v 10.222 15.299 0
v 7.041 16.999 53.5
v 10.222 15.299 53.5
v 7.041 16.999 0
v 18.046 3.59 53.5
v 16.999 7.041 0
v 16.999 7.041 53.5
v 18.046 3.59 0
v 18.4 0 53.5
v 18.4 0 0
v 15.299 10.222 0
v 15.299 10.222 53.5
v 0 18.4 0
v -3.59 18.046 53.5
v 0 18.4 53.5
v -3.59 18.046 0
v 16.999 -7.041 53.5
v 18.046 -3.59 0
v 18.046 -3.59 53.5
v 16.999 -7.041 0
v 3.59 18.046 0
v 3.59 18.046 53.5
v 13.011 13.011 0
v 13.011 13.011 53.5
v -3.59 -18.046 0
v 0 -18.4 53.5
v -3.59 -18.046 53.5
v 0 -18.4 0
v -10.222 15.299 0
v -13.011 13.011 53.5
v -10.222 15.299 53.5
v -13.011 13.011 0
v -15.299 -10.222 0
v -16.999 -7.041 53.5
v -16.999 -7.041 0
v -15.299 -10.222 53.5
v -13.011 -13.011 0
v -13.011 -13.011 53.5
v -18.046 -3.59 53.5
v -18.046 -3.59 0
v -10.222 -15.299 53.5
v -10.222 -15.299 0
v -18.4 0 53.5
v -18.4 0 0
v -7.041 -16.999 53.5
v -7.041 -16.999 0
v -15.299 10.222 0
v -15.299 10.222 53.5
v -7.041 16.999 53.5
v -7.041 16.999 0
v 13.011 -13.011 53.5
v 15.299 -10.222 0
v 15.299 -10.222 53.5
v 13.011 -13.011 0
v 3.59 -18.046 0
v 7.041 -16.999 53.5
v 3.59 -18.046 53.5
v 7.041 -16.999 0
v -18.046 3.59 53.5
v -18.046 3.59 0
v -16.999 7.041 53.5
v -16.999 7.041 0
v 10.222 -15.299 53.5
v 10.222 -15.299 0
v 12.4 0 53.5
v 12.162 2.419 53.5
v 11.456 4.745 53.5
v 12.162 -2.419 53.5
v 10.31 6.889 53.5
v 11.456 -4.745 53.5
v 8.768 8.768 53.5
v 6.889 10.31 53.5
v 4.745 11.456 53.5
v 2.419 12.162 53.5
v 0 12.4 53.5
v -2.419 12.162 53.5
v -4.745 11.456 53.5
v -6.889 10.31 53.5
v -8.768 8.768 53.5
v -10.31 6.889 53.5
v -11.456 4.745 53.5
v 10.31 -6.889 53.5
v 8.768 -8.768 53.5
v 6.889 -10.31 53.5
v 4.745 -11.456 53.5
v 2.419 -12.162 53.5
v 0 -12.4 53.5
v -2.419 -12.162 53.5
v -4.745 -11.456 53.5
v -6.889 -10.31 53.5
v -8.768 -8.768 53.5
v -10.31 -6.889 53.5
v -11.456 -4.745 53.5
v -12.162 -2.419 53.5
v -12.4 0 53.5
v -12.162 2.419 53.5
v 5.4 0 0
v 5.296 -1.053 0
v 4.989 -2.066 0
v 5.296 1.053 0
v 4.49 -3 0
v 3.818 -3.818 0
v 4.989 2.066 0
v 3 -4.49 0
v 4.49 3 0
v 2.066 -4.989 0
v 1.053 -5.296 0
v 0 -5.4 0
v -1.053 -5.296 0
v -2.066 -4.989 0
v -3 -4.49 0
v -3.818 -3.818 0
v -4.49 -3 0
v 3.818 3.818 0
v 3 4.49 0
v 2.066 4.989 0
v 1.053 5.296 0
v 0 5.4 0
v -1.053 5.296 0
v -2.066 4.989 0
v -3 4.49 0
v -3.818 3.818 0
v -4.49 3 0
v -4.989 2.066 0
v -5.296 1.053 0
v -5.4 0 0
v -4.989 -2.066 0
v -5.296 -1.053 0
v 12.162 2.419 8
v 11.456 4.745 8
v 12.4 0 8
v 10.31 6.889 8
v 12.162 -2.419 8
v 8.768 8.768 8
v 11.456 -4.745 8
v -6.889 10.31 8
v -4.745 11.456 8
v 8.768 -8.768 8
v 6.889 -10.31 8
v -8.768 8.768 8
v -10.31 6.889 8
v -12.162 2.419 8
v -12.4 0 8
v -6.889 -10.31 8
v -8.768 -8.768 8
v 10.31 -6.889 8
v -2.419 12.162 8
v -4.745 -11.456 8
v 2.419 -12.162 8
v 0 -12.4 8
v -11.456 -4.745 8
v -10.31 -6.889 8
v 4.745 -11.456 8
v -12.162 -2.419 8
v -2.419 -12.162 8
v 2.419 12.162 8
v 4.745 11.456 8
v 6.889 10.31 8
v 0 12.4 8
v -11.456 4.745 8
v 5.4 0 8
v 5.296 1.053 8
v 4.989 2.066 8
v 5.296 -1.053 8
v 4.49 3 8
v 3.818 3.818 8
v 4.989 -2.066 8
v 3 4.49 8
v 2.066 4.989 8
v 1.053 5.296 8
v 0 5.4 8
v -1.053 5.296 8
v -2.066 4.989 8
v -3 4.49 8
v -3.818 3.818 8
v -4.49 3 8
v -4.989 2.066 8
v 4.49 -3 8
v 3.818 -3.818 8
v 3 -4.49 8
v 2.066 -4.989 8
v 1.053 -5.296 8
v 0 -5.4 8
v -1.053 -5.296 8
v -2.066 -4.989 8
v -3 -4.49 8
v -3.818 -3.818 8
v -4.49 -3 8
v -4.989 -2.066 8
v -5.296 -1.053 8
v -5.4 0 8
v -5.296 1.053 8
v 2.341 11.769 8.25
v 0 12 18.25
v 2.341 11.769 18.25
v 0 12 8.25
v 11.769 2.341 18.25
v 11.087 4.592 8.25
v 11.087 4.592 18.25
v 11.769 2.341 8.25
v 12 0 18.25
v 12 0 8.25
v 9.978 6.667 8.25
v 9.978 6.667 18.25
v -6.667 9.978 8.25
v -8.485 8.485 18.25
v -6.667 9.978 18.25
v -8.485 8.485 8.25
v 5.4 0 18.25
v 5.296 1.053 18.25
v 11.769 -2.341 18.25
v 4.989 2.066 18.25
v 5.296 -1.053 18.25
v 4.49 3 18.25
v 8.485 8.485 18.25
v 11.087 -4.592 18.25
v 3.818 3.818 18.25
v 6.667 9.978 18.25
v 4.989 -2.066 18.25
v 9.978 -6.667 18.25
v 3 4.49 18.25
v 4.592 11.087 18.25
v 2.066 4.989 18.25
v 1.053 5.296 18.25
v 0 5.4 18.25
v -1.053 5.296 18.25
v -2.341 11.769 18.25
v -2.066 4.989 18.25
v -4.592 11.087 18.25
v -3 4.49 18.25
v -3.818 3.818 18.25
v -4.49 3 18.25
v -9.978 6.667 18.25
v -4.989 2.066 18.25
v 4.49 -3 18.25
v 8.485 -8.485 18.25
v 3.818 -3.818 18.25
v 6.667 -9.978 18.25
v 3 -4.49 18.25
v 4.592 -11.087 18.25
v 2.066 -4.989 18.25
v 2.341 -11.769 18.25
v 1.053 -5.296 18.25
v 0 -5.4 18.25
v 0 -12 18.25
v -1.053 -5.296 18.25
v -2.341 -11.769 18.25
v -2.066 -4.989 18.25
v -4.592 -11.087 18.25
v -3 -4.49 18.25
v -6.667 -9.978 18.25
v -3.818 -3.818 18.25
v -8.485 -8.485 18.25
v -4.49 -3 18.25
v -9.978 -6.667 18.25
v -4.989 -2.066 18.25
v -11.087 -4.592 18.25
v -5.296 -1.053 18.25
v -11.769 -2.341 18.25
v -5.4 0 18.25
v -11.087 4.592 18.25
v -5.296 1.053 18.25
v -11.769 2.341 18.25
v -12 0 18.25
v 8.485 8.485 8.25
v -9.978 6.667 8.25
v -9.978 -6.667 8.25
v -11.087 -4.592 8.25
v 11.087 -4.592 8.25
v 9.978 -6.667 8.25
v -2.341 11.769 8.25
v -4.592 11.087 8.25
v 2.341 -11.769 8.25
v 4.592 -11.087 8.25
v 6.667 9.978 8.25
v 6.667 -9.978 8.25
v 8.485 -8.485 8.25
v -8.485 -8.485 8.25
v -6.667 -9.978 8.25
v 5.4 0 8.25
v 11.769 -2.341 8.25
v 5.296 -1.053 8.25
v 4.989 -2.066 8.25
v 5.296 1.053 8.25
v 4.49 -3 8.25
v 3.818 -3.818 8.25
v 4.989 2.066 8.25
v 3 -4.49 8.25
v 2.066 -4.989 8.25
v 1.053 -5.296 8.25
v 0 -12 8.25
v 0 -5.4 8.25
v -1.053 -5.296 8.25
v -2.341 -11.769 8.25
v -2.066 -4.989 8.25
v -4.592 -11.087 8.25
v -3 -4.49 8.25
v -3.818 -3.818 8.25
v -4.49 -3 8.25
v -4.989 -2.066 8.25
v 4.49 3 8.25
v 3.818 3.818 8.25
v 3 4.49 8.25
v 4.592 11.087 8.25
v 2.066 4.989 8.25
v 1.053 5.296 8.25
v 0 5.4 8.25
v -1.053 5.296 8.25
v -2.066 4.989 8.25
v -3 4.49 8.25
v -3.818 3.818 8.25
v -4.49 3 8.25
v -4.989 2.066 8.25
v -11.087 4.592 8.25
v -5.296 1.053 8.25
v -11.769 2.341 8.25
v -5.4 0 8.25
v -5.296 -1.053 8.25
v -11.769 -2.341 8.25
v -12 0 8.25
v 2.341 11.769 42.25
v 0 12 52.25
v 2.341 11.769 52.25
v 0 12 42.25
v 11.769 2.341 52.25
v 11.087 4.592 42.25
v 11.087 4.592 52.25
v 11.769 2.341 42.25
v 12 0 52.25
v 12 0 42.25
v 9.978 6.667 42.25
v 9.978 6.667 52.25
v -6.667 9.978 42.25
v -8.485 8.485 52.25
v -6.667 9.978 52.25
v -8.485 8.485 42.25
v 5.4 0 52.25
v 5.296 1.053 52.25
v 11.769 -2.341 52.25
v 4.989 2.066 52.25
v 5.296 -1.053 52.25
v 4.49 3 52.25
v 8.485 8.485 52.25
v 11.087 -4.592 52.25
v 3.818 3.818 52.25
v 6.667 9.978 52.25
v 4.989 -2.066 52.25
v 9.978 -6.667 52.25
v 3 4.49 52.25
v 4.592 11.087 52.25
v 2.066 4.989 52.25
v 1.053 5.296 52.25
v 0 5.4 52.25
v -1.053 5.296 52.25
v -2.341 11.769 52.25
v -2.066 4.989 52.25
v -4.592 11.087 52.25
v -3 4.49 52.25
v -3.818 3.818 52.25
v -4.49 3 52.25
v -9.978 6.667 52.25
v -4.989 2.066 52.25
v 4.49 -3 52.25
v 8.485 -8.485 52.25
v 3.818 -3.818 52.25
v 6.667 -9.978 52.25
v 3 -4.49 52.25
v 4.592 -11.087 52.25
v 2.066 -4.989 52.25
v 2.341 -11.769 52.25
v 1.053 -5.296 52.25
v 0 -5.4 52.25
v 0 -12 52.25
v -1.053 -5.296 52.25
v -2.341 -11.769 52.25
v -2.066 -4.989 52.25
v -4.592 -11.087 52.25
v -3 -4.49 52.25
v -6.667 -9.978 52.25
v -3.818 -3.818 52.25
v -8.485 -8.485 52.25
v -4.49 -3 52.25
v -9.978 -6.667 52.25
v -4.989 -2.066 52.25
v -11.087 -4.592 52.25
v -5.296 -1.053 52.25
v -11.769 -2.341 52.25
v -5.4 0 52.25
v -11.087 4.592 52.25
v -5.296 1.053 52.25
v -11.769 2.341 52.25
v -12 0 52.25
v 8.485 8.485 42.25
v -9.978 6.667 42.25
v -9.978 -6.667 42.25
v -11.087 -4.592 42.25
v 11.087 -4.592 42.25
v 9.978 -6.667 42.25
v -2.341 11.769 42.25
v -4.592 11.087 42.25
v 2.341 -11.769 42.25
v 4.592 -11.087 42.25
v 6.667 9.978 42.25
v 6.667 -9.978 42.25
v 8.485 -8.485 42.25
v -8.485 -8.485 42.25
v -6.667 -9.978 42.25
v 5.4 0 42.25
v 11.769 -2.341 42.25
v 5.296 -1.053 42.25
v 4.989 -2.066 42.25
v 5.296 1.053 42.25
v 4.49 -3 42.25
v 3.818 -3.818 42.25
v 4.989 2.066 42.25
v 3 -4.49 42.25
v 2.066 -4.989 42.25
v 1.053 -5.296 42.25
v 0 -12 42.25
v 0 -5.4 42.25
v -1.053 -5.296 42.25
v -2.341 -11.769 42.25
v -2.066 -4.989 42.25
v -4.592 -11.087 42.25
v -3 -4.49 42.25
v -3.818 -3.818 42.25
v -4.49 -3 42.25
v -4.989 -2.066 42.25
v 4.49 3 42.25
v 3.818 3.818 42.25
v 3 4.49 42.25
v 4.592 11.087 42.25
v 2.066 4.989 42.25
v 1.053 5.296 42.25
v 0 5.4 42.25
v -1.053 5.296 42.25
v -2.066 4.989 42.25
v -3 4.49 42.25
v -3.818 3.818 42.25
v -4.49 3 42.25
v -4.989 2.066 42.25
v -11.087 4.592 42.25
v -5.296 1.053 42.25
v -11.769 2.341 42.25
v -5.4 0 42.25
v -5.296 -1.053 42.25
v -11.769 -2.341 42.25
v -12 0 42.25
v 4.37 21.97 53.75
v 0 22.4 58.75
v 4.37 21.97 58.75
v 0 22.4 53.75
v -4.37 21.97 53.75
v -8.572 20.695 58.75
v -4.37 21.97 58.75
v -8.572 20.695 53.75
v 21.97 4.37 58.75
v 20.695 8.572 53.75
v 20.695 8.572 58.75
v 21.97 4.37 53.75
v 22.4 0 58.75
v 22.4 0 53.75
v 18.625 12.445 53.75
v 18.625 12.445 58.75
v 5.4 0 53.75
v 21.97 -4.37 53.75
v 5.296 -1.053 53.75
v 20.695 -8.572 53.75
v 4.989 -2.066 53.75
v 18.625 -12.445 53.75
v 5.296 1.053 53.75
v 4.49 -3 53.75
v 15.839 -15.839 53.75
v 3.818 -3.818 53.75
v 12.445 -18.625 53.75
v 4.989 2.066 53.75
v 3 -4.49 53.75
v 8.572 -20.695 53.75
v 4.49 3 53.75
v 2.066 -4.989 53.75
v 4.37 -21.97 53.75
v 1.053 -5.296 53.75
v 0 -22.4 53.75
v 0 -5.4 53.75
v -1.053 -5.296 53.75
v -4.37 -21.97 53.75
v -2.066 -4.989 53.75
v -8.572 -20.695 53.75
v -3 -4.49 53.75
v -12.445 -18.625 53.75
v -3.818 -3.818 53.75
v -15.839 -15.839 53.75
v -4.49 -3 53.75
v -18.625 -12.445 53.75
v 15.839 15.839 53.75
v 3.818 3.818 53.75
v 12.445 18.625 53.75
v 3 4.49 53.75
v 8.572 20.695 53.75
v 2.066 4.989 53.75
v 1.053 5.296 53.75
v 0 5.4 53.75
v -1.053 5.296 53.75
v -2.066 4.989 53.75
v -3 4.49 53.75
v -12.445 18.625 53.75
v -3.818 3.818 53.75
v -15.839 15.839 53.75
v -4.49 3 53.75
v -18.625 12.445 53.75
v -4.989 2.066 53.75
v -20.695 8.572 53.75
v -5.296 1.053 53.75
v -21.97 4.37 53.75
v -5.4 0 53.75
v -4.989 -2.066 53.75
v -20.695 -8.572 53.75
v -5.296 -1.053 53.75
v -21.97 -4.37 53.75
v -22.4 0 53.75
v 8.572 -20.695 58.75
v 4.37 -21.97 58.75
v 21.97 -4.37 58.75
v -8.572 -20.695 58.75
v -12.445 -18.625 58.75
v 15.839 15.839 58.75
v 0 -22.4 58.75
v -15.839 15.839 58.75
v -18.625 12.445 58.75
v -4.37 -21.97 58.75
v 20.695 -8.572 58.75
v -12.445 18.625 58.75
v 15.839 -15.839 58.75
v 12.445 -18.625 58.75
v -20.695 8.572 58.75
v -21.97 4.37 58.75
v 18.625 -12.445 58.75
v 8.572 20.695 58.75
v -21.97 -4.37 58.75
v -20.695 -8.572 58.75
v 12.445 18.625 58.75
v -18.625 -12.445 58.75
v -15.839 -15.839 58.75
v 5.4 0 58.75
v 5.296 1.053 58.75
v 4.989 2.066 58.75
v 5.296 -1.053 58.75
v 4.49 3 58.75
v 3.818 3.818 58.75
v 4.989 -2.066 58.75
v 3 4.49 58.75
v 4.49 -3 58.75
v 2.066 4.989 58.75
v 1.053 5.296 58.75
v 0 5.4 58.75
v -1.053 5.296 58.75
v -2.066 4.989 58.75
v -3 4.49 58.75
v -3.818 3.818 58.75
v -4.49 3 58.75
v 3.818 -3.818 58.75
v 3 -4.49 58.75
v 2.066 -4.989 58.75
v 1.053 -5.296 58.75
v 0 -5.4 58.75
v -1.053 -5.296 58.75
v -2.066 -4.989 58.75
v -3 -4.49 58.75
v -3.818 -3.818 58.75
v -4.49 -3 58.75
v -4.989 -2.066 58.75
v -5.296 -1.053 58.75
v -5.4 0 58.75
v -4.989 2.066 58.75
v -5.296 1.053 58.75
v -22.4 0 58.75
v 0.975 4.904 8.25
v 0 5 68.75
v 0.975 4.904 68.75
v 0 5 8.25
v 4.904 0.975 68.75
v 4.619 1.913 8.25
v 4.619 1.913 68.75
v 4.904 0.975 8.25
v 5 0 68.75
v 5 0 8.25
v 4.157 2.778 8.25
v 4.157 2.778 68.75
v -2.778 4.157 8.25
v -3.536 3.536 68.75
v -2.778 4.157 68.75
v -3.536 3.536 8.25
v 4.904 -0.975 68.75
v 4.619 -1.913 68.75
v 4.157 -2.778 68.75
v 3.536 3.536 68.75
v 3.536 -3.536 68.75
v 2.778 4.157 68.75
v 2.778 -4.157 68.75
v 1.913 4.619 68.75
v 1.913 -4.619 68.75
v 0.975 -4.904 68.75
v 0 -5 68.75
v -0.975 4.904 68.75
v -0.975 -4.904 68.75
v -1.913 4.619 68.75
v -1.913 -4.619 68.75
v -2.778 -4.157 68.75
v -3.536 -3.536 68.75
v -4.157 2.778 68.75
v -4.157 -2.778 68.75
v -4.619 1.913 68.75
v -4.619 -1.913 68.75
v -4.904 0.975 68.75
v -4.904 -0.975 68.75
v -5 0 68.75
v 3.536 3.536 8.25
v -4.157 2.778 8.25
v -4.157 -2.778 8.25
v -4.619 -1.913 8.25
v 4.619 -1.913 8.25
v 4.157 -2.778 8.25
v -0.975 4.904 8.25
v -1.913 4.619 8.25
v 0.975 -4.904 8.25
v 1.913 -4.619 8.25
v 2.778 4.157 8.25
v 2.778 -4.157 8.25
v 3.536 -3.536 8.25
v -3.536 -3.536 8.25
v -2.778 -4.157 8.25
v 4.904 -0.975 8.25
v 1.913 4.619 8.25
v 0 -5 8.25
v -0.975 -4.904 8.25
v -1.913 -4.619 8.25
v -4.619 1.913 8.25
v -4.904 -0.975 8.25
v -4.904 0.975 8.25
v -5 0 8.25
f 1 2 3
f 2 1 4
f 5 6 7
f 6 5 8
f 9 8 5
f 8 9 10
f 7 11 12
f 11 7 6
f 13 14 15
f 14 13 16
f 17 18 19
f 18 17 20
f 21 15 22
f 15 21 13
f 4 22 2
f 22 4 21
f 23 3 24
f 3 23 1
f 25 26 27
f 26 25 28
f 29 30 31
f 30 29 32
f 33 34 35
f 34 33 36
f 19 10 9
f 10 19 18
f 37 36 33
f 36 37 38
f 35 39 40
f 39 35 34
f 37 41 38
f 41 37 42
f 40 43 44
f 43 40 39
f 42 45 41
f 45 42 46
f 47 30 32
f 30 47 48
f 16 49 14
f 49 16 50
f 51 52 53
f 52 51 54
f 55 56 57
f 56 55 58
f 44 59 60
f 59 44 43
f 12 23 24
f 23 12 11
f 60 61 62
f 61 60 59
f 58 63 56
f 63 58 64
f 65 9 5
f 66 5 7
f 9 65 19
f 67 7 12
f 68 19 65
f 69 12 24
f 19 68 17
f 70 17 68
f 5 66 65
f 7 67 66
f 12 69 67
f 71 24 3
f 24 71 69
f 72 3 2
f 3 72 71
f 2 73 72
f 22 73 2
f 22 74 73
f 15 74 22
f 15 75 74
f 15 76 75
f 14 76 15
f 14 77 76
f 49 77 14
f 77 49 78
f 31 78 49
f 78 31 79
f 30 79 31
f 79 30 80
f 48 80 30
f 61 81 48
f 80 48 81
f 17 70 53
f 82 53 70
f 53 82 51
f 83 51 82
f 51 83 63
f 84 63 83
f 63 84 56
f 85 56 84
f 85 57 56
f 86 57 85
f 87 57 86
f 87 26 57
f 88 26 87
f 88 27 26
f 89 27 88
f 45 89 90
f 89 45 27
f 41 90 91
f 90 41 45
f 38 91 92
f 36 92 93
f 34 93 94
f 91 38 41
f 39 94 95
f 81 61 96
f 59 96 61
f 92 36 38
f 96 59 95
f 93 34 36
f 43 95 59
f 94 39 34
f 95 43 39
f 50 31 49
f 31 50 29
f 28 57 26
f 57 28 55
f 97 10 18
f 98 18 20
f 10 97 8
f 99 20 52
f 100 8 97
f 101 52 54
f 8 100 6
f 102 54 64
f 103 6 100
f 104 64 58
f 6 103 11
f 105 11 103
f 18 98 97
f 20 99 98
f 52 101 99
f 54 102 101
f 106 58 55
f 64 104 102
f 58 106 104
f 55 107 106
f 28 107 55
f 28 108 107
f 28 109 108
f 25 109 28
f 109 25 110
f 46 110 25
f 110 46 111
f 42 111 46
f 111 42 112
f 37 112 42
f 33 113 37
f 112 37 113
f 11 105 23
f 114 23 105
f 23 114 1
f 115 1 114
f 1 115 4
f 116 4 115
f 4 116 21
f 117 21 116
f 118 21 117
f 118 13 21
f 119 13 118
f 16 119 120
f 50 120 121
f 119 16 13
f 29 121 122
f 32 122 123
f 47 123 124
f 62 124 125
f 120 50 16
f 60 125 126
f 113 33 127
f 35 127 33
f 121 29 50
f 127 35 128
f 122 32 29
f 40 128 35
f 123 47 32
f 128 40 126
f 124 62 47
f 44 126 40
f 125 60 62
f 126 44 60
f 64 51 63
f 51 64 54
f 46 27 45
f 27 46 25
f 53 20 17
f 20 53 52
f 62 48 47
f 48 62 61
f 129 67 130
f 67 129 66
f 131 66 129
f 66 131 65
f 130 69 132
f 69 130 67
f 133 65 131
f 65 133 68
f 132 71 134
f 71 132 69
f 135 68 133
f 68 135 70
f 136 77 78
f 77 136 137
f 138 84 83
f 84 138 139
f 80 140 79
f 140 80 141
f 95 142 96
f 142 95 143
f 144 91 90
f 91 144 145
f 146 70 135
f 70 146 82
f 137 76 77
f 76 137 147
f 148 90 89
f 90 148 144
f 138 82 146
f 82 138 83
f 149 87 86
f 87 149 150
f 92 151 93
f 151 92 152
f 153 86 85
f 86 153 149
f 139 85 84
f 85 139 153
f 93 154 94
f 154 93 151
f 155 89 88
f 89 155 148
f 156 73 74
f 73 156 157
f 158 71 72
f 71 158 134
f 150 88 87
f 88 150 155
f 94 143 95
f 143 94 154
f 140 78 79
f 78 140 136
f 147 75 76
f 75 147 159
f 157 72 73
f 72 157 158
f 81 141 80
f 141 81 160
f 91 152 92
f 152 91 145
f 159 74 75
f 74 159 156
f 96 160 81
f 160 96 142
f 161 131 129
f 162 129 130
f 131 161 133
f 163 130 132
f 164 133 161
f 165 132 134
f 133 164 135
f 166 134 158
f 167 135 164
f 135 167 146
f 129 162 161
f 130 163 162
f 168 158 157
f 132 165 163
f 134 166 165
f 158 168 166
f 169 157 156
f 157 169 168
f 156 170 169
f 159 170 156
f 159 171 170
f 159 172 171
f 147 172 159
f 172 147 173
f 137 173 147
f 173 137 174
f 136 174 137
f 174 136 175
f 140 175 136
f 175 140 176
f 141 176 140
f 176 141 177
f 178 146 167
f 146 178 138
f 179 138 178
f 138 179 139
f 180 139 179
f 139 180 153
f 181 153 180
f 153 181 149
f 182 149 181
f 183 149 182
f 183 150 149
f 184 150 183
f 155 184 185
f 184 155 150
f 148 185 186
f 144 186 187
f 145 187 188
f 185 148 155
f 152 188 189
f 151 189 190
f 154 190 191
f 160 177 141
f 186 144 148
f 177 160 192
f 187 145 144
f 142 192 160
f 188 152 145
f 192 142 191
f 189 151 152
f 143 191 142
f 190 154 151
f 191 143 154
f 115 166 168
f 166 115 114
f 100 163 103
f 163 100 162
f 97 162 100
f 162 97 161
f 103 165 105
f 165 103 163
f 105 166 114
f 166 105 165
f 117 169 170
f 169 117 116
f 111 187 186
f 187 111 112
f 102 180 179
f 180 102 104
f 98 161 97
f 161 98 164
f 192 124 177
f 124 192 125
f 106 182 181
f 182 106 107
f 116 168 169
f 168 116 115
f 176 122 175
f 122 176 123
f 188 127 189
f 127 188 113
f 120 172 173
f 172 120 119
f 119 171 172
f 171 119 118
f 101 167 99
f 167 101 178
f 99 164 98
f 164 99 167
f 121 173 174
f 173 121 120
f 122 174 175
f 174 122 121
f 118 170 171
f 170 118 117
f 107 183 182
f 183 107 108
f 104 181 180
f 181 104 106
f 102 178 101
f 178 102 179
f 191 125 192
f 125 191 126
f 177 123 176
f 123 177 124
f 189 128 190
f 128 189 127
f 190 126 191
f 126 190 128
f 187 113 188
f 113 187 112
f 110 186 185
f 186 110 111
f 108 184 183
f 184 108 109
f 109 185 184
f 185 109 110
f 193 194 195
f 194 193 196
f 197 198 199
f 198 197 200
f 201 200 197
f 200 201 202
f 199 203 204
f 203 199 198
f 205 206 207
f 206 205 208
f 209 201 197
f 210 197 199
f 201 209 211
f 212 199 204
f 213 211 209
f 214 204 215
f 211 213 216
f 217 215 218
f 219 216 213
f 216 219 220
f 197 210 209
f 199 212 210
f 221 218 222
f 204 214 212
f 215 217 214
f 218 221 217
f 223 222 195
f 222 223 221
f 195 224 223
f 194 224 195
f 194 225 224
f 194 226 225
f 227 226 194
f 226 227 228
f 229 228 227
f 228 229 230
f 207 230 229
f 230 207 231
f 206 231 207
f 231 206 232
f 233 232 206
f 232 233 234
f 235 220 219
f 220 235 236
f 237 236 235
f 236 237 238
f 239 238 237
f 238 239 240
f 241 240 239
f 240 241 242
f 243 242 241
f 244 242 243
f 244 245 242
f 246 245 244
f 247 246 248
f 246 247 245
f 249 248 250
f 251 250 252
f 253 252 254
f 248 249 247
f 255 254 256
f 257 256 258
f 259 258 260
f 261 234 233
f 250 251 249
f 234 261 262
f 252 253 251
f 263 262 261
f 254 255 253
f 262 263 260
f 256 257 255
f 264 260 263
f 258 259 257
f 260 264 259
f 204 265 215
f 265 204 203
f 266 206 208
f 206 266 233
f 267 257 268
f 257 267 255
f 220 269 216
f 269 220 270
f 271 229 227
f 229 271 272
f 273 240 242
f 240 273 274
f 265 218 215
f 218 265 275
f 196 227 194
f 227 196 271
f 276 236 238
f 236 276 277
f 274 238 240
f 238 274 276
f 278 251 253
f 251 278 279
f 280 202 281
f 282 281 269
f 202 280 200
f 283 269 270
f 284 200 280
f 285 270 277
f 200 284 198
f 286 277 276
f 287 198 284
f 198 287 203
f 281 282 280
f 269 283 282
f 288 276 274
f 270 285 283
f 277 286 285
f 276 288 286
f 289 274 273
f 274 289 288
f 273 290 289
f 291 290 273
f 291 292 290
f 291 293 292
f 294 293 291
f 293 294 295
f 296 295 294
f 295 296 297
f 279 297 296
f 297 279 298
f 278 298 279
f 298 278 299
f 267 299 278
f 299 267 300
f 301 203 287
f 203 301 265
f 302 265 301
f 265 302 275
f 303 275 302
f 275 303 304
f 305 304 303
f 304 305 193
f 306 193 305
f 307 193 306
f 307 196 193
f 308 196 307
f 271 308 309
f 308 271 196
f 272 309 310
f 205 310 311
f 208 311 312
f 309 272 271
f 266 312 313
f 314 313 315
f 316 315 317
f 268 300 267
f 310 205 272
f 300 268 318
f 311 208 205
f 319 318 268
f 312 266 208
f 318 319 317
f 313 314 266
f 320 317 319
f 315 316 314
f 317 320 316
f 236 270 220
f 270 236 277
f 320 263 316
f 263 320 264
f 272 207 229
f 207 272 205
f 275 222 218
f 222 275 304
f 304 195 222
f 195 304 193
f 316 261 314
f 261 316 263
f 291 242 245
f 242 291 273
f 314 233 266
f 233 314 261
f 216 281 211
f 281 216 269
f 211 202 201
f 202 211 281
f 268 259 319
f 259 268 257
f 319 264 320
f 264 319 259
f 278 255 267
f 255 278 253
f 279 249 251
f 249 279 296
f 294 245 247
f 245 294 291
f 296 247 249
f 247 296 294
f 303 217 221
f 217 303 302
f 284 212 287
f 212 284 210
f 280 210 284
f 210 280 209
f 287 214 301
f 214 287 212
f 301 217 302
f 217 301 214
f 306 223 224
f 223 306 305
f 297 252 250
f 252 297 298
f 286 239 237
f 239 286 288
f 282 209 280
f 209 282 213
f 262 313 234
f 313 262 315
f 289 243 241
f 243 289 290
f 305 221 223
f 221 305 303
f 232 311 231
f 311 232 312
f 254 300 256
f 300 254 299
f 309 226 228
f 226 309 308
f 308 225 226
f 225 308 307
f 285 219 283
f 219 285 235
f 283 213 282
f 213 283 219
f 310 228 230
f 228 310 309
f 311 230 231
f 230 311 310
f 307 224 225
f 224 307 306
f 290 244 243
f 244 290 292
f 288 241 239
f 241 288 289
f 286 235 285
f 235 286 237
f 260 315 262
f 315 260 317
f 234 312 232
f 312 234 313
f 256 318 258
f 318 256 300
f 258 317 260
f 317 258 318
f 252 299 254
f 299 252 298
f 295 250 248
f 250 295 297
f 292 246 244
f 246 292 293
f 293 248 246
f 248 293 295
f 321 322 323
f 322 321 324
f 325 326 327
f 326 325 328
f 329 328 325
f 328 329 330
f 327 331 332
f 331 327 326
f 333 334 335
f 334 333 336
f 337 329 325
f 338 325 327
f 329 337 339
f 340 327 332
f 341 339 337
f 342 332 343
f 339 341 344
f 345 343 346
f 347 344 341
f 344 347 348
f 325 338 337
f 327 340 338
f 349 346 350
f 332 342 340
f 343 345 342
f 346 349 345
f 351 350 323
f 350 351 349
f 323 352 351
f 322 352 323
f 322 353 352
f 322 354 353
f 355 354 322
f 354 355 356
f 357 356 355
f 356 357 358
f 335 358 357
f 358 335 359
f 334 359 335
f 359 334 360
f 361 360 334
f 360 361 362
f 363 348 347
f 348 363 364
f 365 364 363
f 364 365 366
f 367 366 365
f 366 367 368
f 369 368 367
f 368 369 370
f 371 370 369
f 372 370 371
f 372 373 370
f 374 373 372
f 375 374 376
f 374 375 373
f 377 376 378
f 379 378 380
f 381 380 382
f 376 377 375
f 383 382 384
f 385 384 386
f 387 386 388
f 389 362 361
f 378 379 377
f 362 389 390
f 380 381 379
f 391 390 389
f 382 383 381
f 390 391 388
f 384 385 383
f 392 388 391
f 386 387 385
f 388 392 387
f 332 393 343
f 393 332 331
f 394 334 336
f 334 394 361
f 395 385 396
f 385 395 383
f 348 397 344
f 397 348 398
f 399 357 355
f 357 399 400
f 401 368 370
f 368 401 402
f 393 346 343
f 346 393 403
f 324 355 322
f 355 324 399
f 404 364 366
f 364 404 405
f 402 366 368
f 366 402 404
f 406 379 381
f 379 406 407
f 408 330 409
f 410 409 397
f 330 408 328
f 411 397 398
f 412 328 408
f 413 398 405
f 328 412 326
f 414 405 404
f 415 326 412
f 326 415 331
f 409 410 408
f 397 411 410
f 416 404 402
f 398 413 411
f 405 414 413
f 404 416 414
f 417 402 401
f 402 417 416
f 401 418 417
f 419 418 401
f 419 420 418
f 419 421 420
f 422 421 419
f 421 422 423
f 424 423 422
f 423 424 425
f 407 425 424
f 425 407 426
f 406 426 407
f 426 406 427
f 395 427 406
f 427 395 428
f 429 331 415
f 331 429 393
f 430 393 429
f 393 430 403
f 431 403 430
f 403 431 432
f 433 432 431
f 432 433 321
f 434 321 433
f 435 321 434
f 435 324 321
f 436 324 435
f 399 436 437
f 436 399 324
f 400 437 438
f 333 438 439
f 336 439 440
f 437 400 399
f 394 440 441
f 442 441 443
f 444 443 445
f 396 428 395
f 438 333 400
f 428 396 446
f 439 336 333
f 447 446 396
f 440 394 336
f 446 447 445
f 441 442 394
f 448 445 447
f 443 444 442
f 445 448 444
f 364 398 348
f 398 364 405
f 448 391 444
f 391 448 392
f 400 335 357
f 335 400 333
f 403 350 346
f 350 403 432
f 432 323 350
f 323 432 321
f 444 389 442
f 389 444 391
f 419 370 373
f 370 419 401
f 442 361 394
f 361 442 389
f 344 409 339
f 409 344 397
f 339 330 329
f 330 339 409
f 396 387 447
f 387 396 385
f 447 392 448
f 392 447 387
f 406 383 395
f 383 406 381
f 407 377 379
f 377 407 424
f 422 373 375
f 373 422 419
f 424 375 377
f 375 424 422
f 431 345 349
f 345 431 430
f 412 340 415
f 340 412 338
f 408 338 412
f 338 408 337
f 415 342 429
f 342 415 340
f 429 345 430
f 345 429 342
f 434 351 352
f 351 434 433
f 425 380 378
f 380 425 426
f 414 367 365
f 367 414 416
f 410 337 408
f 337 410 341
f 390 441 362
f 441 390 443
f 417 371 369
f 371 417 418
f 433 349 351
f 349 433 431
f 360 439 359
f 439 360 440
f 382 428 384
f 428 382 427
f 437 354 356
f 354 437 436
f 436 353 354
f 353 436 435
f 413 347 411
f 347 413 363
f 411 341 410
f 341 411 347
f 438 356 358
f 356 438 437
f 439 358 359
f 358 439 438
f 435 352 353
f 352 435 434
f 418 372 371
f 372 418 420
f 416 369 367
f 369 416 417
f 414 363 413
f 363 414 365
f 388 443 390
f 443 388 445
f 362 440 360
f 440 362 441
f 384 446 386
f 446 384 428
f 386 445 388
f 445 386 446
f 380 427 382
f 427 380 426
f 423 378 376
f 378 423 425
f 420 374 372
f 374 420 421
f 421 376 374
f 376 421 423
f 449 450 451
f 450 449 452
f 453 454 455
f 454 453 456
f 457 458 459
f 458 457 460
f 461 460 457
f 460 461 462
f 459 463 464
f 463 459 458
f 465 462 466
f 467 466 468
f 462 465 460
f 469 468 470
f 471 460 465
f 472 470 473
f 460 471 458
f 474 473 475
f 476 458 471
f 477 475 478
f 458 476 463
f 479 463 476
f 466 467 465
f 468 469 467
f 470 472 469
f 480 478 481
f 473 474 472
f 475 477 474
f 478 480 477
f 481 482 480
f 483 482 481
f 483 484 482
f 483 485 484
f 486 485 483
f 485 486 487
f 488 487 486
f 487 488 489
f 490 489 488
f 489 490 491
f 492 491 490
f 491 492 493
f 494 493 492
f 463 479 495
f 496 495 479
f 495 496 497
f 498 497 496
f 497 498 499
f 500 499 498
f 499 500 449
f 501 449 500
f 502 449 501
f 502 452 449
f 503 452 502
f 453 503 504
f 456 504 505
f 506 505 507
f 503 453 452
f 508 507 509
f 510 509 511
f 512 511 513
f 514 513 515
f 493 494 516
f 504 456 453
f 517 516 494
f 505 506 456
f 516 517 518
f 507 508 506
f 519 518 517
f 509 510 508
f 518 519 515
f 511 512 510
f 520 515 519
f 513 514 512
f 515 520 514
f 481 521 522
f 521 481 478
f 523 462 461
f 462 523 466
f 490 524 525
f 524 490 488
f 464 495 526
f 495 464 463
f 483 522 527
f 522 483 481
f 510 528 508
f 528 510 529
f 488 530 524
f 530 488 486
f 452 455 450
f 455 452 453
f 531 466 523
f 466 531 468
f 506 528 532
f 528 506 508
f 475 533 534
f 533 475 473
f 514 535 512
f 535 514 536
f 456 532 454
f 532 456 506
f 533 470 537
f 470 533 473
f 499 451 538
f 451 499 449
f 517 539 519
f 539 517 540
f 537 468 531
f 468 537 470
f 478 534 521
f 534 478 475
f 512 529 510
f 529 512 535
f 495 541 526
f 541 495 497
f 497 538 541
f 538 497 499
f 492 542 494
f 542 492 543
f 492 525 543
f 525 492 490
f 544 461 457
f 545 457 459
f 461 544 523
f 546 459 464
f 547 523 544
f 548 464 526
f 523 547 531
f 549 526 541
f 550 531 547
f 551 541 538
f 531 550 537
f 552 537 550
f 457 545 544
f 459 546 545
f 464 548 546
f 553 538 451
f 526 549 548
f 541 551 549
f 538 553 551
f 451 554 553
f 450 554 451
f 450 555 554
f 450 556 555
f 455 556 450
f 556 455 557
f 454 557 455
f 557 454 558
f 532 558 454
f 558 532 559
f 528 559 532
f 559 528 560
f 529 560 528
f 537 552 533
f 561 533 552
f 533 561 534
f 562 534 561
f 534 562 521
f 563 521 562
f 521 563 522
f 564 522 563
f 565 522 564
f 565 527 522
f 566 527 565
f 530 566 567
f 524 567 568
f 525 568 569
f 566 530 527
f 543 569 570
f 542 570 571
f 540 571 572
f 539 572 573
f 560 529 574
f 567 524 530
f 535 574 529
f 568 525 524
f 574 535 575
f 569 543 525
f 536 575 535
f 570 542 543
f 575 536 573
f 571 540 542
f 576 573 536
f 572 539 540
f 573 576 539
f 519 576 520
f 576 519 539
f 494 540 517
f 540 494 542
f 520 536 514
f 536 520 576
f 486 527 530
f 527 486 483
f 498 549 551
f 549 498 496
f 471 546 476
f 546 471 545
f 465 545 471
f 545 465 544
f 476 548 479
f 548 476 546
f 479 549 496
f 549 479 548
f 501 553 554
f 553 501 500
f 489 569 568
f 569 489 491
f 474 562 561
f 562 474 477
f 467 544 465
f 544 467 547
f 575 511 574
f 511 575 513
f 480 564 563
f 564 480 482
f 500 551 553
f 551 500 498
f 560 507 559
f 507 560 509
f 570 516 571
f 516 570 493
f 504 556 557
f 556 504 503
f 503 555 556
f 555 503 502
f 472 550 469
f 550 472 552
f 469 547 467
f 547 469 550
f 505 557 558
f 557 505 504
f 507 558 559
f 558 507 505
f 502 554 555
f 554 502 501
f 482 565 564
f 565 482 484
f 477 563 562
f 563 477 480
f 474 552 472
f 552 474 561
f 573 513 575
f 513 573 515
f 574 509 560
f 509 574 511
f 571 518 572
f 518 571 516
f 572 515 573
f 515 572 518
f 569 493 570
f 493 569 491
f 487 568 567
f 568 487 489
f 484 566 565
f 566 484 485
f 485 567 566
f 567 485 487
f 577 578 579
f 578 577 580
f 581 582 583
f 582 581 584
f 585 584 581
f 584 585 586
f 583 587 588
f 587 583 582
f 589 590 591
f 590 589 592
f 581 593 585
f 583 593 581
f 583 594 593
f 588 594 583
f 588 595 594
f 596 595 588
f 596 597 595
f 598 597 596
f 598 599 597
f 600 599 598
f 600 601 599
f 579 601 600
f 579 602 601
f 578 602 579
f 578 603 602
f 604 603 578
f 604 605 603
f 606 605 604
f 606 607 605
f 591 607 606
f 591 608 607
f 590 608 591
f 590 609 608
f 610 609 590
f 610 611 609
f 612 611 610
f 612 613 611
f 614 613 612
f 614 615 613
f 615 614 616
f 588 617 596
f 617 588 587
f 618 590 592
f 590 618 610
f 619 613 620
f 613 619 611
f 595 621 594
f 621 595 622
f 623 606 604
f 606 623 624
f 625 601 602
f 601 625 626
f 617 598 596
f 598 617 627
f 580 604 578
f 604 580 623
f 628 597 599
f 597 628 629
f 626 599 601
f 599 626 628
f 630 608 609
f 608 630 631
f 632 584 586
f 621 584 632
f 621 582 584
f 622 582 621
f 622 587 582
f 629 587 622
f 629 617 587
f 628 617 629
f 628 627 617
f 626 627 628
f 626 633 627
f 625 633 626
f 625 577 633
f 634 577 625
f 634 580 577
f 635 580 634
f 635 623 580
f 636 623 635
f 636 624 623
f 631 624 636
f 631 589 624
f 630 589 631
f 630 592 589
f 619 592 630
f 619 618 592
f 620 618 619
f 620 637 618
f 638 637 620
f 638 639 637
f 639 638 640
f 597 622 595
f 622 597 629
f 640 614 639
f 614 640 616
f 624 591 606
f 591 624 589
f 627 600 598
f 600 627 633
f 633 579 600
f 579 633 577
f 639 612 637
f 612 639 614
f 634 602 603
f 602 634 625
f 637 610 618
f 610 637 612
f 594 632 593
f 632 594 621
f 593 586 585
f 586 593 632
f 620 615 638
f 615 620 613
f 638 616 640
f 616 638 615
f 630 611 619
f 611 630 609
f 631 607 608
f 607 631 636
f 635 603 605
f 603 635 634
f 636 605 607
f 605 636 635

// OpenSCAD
$fn = 32;

// ------------------------------------------------------------------------
// Shaft station: cup d36.8 x 53.5 mm, shaft d10
// Every part is its own module, assembly() places every instance.
// ------------------------------------------------------------------------

// --- part 1 ---
module housing_cup() {
  difference() {
    cylinder(h = 53.5, d = 36.8);
    translate([0, 0, 8]) cylinder(h = 46.5, d = 24.8);
    translate([0, 0, -1]) cylinder(h = 10, d = 10.8);
  }
}

// --- part 2 ---
module bearing_lower() {
  difference() {
      translate([0, 0, 0]) cylinder(h = 10, d = 24);
      translate([0, 0, -1]) cylinder(h = 12, d = 10.8);
    }
}

// --- part 3 ---
module bearing_upper() {
  difference() {
      translate([0, 0, 0]) cylinder(h = 10, d = 24);
      translate([0, 0, -1]) cylinder(h = 12, d = 10.8);
    }
}

// --- part 4 ---
module station_shaft() {
  translate([0, 0, -30.25]) cylinder(h = 60.5, d = 10);
}

// --- part 5 ---
module station_cover() {
  difference() {
    cylinder(h = 5, d = 44.8);
    translate([0, 0, -1]) cylinder(h = 7, d = 10.8);
  }
}

// --- assembly ---
module assembly() {
  color([0.80, 0.24, 0.20]) translate([0, 0, 0]) rotate([0, 0, 0]) housing_cup();
  color([0.20, 0.45, 0.75]) translate([0, 0, 8.25]) rotate([0, 0, 0]) bearing_lower();
  color([0.25, 0.62, 0.32]) translate([0, 0, 42.25]) rotate([0, 0, 0]) bearing_upper();
  color([0.92, 0.70, 0.18]) translate([0, 0, 38.5]) rotate([0, 0, 0]) station_shaft();
  color([0.58, 0.35, 0.70]) translate([0, 0, 53.75]) rotate([0, 0, 0]) station_cover();
}

assembly();
